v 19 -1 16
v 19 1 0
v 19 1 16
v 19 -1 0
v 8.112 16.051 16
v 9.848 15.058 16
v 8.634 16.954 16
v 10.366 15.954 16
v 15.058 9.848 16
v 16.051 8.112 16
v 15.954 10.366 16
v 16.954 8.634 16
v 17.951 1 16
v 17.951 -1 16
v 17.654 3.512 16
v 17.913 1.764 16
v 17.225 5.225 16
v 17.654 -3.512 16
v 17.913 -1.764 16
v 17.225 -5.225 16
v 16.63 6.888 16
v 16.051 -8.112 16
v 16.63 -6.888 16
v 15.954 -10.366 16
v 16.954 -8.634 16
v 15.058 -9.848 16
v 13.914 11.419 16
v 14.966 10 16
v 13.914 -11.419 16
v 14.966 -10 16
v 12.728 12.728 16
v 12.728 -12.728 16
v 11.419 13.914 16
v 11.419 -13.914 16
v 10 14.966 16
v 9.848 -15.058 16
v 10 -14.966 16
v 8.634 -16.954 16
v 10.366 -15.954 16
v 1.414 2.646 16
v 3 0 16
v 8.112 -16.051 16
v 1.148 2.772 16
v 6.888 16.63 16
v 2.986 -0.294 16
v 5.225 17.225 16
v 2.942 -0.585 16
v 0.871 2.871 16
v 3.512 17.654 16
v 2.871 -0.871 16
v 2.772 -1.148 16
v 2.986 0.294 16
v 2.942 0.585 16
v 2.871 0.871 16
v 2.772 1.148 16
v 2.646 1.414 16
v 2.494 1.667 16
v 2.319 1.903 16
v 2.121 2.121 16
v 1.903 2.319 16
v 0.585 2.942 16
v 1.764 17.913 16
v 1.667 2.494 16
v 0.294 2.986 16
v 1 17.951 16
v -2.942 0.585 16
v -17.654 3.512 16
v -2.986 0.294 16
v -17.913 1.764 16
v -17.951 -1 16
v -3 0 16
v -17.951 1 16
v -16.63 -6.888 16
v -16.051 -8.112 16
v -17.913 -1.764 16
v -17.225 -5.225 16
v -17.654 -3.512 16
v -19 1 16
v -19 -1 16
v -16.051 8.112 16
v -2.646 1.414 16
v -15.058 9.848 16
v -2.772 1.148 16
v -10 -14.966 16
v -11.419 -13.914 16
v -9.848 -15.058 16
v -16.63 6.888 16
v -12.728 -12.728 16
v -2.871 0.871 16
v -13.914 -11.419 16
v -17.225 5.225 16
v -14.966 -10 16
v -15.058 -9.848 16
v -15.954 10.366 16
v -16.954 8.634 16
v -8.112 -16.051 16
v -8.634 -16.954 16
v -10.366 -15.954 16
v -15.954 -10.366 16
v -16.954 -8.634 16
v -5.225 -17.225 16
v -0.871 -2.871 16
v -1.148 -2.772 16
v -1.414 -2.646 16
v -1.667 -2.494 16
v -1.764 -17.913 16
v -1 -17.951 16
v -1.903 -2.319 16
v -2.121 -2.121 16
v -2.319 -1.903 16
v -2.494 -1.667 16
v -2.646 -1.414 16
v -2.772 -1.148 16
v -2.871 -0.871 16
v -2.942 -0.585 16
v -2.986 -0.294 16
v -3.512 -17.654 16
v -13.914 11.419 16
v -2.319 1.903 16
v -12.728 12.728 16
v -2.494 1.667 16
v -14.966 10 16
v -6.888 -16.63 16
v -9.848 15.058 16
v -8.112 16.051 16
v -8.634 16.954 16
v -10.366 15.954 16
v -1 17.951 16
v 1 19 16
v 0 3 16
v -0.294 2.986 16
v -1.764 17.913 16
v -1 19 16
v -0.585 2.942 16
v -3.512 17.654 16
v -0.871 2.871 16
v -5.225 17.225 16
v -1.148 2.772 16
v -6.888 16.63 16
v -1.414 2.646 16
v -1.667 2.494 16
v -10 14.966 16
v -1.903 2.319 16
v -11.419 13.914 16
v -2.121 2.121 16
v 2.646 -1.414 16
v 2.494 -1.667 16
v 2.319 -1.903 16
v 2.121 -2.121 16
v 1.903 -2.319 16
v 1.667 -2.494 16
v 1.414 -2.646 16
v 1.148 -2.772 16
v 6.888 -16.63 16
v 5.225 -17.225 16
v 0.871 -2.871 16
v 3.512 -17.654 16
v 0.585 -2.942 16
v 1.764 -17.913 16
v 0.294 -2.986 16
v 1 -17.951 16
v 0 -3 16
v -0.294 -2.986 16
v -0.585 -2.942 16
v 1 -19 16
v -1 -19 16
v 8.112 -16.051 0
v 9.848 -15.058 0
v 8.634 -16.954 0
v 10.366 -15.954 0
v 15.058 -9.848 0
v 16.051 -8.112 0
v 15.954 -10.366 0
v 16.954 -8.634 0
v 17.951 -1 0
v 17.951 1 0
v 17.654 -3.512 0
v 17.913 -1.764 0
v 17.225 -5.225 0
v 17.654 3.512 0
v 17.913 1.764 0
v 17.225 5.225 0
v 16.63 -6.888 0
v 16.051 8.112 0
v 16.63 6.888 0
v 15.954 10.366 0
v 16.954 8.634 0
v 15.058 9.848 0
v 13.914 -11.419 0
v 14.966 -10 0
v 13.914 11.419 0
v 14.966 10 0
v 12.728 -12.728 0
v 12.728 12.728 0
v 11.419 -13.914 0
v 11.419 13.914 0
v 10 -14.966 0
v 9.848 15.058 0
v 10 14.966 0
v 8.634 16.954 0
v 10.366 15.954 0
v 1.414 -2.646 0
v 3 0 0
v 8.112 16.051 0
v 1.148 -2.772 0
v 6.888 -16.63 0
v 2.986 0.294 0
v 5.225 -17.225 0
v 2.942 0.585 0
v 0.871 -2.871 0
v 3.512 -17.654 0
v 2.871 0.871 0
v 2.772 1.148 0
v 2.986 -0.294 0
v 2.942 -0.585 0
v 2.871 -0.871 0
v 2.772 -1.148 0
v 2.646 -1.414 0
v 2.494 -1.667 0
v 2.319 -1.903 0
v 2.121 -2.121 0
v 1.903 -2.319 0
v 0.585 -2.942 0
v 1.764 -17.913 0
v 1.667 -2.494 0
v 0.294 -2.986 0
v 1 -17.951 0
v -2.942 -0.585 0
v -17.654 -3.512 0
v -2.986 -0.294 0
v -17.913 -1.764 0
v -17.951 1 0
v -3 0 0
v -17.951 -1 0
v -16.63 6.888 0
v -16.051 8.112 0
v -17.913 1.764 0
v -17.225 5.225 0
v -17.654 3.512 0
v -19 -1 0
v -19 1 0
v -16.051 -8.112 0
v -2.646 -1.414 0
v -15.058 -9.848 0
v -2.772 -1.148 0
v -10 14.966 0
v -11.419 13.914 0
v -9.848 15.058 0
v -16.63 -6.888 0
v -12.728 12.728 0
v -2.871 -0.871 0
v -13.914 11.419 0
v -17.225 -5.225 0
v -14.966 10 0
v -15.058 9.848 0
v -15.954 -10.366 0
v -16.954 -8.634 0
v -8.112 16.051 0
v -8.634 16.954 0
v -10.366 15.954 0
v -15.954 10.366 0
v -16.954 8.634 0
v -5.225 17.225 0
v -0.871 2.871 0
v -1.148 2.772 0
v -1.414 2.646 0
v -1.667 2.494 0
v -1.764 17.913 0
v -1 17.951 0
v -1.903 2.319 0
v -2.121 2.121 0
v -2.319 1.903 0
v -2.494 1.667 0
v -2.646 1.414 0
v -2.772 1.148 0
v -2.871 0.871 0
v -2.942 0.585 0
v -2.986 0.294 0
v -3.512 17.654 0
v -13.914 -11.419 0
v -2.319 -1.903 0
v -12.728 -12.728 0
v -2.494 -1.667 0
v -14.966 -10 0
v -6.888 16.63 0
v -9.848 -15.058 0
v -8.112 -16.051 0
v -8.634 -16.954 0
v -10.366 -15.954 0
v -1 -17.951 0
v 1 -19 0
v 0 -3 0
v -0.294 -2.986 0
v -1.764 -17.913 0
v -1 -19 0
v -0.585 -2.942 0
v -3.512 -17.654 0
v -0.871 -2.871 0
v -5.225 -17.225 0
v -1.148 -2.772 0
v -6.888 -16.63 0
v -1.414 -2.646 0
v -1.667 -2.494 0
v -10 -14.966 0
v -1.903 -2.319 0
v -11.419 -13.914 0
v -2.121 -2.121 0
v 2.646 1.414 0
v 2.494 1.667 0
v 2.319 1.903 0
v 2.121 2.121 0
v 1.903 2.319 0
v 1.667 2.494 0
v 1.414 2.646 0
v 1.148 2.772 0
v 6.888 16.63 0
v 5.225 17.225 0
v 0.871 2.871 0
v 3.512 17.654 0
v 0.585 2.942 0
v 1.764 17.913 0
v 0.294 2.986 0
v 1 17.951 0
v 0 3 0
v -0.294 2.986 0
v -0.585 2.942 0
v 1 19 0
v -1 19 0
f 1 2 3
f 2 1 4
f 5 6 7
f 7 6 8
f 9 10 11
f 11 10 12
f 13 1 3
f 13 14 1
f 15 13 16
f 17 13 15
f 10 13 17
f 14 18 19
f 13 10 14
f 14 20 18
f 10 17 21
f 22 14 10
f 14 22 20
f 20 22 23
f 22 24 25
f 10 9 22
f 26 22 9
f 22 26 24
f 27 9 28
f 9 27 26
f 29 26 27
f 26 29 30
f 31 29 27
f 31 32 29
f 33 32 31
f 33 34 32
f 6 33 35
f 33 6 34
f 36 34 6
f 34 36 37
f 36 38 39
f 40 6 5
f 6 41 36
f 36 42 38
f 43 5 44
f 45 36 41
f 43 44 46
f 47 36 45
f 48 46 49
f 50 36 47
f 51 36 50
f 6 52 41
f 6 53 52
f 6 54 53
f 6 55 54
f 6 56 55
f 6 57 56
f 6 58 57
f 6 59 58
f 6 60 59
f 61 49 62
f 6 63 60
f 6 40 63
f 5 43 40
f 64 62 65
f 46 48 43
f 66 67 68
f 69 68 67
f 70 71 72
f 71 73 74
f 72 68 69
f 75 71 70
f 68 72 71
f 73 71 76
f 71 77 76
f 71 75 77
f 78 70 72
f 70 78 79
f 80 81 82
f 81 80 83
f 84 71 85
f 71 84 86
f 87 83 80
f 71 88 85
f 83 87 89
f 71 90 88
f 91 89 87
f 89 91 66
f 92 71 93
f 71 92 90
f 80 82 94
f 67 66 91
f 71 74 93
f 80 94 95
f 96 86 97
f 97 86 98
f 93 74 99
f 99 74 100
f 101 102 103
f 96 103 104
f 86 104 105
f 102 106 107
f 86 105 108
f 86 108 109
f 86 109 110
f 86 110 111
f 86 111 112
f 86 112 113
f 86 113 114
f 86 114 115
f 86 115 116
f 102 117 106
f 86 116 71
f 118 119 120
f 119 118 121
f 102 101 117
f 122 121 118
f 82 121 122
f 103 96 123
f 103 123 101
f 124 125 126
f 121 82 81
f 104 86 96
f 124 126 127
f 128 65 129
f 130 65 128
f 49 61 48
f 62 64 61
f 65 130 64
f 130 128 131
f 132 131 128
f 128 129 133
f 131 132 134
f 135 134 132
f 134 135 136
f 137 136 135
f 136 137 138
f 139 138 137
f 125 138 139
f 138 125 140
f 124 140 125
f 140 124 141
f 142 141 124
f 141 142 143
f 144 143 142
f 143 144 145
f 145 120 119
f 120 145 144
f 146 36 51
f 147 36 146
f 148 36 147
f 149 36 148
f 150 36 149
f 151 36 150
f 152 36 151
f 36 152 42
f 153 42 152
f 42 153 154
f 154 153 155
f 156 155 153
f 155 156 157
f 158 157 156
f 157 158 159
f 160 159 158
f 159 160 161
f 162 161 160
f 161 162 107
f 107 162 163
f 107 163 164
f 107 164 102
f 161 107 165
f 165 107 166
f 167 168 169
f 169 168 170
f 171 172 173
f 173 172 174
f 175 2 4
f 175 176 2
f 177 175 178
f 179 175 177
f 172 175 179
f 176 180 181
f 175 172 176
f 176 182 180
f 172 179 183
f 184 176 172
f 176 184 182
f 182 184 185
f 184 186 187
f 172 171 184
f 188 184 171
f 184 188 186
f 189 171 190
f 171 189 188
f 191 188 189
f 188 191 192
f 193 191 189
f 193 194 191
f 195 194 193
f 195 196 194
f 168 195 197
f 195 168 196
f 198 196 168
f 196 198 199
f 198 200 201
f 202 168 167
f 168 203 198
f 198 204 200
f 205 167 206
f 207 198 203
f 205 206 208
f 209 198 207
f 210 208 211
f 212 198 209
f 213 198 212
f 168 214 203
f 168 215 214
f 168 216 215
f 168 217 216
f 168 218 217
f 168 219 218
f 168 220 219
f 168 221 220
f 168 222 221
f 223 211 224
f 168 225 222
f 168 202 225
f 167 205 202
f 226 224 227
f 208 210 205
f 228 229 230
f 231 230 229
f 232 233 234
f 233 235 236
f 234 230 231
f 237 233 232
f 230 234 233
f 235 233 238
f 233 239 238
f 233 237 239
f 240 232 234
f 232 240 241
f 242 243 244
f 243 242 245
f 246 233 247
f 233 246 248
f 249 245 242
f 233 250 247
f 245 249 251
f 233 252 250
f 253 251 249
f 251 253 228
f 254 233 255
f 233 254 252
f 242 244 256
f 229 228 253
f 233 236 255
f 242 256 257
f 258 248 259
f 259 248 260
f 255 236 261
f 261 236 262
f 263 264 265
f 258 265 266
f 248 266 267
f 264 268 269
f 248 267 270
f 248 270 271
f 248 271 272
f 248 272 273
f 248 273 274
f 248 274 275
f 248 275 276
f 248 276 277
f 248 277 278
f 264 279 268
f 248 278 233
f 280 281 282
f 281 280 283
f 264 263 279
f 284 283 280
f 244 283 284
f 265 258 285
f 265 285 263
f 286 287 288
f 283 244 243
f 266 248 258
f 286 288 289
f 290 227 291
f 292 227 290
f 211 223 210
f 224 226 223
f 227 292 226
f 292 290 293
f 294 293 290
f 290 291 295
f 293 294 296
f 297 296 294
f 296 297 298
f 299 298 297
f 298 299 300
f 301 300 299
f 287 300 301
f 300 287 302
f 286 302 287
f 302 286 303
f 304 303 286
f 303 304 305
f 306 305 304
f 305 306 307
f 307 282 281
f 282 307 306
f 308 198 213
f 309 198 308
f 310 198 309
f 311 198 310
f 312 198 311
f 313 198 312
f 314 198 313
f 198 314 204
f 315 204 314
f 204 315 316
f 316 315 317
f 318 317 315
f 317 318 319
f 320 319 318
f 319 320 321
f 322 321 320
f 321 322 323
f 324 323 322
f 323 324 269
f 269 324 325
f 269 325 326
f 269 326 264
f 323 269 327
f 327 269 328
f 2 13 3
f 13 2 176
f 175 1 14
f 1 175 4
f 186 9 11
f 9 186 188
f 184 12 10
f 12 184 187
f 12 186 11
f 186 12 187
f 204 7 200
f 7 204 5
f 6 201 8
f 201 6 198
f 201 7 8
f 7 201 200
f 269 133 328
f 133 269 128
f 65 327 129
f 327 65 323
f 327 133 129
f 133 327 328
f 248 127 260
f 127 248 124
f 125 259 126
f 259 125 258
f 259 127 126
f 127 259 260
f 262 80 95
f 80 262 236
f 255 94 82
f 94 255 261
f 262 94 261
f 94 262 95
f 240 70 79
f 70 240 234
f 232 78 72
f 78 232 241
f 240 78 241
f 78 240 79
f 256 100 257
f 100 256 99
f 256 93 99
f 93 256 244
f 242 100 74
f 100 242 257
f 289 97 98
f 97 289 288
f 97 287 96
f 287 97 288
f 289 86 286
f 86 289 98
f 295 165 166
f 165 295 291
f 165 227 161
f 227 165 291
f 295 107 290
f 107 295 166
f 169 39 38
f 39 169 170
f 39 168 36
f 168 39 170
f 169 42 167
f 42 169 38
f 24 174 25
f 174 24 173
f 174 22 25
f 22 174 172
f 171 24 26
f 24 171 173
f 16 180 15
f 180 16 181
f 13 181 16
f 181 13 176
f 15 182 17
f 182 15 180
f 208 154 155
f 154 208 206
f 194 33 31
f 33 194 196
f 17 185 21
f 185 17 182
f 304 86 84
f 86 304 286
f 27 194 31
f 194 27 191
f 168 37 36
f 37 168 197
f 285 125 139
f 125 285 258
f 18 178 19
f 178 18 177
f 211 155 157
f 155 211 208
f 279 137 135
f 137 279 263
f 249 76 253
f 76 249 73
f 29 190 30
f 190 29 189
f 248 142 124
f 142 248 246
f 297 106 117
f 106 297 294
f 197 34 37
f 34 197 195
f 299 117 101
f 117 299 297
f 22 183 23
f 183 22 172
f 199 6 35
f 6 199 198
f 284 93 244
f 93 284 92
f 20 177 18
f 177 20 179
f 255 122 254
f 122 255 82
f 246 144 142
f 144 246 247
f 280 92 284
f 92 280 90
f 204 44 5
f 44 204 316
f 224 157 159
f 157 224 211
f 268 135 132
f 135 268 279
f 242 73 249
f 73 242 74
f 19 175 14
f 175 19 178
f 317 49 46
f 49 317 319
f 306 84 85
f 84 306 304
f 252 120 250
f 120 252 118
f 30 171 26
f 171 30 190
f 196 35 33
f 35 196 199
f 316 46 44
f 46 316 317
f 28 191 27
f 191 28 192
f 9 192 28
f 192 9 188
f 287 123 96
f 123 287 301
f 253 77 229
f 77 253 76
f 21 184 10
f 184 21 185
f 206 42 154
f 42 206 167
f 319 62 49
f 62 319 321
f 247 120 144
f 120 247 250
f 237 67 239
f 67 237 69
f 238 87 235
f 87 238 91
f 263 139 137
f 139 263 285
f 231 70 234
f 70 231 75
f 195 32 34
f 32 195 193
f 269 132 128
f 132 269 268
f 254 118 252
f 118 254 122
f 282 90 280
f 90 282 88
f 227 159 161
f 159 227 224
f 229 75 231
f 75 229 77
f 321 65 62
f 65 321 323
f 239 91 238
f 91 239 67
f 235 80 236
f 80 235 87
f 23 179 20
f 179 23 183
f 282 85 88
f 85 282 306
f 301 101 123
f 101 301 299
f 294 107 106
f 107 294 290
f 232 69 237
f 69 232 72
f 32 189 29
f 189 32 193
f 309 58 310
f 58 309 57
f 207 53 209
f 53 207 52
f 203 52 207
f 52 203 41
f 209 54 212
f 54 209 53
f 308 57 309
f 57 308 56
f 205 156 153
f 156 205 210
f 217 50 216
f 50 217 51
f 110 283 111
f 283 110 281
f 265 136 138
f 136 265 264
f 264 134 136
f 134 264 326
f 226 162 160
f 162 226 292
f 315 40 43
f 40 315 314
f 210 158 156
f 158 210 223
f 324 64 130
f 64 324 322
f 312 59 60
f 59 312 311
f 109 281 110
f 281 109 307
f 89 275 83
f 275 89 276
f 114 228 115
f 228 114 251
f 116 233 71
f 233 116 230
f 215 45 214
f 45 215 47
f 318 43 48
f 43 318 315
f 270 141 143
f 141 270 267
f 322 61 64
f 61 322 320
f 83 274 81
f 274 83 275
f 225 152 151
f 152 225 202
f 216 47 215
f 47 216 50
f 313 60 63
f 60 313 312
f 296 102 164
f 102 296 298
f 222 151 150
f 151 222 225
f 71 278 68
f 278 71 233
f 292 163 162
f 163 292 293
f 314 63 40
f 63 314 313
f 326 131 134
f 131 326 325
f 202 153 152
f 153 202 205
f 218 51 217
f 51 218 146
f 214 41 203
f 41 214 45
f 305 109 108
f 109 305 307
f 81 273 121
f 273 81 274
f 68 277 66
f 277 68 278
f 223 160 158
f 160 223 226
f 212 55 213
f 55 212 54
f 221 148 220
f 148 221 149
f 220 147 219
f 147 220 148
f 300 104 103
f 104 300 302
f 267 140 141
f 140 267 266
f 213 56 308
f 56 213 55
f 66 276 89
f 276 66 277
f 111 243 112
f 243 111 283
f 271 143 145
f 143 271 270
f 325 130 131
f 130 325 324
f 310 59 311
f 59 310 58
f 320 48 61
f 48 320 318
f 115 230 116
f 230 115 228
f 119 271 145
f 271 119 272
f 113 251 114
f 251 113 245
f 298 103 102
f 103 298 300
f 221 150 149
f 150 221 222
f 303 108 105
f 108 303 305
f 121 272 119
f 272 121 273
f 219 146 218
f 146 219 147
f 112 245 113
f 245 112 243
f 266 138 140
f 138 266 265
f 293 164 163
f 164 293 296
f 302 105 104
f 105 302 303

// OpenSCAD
// Starter ribbed wheel for task-025.
$fn = 64;

ribs = 12;
outside_diameter = 38;
height = 16;
center_hole_diameter = 6;

difference() {
  union() {
    cylinder(h = height, r = outside_diameter / 2 - 1);
    for (i = [0 : ribs - 1])
      rotate([0, 0, 360 * i / ribs])
        translate([8, -1, 0])
          cube([11, 2, height]);
  }

  translate([0, 0, -1])
    cylinder(h = height + 2, r = center_hole_diameter / 2);
}
